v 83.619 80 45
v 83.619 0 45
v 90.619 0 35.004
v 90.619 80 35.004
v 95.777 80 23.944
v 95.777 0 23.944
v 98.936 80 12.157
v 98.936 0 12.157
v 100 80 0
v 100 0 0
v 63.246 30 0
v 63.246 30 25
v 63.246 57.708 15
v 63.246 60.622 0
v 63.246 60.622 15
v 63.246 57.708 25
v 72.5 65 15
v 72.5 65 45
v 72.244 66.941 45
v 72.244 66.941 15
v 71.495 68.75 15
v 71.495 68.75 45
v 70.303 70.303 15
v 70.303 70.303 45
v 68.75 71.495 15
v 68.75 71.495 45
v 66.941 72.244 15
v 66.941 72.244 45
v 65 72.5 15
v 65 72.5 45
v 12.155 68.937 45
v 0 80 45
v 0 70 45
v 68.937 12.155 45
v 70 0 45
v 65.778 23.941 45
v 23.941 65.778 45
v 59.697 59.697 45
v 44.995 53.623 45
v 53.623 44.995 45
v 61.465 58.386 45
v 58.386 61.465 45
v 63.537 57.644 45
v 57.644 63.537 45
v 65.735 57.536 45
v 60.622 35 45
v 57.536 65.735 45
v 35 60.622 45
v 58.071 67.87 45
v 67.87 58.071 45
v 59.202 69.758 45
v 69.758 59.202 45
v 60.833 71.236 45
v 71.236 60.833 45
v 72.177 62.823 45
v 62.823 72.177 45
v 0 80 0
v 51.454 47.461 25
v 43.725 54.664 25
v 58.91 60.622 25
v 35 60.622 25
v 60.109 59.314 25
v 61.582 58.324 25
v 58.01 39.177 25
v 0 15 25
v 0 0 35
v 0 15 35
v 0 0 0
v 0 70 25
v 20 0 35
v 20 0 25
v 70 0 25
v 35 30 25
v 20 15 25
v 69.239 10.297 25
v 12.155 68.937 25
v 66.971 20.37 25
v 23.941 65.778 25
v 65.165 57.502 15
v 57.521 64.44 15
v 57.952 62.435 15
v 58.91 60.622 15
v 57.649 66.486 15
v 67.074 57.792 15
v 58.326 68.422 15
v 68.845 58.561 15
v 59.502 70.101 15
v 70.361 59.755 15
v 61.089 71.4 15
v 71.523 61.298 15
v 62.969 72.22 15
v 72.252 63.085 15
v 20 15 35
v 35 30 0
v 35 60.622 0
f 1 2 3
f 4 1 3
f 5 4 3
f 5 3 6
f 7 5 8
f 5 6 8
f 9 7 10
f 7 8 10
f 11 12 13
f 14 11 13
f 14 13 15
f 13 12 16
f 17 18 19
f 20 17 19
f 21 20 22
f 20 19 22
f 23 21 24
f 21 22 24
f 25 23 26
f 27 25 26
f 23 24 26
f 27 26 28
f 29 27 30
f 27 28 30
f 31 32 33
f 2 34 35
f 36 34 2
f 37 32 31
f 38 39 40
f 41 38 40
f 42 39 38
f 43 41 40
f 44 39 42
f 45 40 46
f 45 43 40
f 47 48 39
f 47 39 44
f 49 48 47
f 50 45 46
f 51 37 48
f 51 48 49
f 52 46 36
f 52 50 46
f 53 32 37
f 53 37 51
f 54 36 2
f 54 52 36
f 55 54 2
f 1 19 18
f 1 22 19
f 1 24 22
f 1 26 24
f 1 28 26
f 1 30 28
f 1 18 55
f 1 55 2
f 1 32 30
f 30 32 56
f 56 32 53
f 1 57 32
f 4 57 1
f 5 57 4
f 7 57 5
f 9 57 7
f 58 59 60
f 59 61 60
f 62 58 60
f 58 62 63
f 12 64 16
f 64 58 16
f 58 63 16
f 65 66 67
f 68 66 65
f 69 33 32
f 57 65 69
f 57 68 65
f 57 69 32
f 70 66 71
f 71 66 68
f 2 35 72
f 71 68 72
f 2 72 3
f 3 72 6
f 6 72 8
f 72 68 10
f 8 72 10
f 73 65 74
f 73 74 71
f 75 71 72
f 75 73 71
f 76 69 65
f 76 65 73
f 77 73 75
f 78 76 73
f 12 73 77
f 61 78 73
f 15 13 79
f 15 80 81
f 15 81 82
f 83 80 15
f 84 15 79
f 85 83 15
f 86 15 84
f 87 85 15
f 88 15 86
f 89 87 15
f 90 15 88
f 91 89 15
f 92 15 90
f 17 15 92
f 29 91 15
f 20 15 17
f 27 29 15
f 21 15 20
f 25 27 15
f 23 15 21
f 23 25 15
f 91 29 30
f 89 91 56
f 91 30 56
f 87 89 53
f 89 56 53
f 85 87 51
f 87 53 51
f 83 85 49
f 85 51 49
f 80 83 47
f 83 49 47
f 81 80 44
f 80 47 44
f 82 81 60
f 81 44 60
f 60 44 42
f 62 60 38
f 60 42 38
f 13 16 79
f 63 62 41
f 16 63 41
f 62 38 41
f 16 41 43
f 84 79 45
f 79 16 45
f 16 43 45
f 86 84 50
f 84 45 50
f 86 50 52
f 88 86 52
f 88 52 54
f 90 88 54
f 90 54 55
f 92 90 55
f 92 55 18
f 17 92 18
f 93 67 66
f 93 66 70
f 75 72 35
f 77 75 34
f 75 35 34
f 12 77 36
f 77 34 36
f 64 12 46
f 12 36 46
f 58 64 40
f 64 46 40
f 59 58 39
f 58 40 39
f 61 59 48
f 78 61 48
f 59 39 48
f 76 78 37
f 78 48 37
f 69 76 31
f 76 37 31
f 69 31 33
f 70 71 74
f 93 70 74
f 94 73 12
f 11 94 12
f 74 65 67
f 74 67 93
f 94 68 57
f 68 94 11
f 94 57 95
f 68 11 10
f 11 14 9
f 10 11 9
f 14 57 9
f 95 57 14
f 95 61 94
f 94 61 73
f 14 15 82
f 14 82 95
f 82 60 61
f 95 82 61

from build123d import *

# Parameters (mm, degrees)
F0_W      = 100
F0_H      = 80
F1_DEPTH  = 45
F3_DEPTH  = 30
F4_R      = 70
F5_DEPTH  = 20
F6_W      = 20
F6_H      = 15
F7_DEPTH  = 10
F9_DEPTH  = 25
F11_DEPTH = 80


with BuildPart() as f1:
    # F0 (on Top) → F1 (new body)
    with BuildSketch(Plane.XY):
        with Locations((50, 40)):
            Rectangle(F0_W, F0_H)
    extrude(amount=F1_DEPTH)

    # F2 (on face) → F3 (cut)
    with BuildSketch(Plane.XY.offset(45)):
        with BuildLine():
            ThreePointArc((72.5, 65), (70.303301, 70.303301), (65, 72.5))
            ThreePointArc((65, 72.5), (59.696699, 59.696699), (72.5, 65))
        make_face()
    extrude(amount=-F3_DEPTH, mode=Mode.SUBTRACT)

    # F4 (on face) → F5 (cut)
    with BuildSketch(Plane.XY.offset(45)):
        Circle(F4_R)
    extrude(amount=-F5_DEPTH, mode=Mode.SUBTRACT)

    # F6 (on face) → F7 (join)
    with BuildSketch(Plane.XY.offset(25)):
        with Locations((10, 7.5)):
            Rectangle(F6_W, F6_H)
    extrude(amount=F7_DEPTH)

    # F8 (on face) → F9 (cut, through all)
    with BuildSketch(Plane.XY.offset(25)):
        Polygon((35, 60.621778), (35, 30), (63.245553, 30), (63.245553, 60.622), align=None)
    extrude(amount=-F9_DEPTH, mode=Mode.SUBTRACT)

    # F10 (on face) → F11 (cut, through all)
    with BuildSketch(Plane.XZ):
        with BuildLine():
            ThreePointArc((83.619026, 45), (95.777397, 23.944395), (100, 0))
            Line((100, 0), (100, 45))
            Line((100, 45), (83.619026, 45))
        make_face()
    extrude(amount=-F11_DEPTH, mode=Mode.SUBTRACT)


solid = f1.part
